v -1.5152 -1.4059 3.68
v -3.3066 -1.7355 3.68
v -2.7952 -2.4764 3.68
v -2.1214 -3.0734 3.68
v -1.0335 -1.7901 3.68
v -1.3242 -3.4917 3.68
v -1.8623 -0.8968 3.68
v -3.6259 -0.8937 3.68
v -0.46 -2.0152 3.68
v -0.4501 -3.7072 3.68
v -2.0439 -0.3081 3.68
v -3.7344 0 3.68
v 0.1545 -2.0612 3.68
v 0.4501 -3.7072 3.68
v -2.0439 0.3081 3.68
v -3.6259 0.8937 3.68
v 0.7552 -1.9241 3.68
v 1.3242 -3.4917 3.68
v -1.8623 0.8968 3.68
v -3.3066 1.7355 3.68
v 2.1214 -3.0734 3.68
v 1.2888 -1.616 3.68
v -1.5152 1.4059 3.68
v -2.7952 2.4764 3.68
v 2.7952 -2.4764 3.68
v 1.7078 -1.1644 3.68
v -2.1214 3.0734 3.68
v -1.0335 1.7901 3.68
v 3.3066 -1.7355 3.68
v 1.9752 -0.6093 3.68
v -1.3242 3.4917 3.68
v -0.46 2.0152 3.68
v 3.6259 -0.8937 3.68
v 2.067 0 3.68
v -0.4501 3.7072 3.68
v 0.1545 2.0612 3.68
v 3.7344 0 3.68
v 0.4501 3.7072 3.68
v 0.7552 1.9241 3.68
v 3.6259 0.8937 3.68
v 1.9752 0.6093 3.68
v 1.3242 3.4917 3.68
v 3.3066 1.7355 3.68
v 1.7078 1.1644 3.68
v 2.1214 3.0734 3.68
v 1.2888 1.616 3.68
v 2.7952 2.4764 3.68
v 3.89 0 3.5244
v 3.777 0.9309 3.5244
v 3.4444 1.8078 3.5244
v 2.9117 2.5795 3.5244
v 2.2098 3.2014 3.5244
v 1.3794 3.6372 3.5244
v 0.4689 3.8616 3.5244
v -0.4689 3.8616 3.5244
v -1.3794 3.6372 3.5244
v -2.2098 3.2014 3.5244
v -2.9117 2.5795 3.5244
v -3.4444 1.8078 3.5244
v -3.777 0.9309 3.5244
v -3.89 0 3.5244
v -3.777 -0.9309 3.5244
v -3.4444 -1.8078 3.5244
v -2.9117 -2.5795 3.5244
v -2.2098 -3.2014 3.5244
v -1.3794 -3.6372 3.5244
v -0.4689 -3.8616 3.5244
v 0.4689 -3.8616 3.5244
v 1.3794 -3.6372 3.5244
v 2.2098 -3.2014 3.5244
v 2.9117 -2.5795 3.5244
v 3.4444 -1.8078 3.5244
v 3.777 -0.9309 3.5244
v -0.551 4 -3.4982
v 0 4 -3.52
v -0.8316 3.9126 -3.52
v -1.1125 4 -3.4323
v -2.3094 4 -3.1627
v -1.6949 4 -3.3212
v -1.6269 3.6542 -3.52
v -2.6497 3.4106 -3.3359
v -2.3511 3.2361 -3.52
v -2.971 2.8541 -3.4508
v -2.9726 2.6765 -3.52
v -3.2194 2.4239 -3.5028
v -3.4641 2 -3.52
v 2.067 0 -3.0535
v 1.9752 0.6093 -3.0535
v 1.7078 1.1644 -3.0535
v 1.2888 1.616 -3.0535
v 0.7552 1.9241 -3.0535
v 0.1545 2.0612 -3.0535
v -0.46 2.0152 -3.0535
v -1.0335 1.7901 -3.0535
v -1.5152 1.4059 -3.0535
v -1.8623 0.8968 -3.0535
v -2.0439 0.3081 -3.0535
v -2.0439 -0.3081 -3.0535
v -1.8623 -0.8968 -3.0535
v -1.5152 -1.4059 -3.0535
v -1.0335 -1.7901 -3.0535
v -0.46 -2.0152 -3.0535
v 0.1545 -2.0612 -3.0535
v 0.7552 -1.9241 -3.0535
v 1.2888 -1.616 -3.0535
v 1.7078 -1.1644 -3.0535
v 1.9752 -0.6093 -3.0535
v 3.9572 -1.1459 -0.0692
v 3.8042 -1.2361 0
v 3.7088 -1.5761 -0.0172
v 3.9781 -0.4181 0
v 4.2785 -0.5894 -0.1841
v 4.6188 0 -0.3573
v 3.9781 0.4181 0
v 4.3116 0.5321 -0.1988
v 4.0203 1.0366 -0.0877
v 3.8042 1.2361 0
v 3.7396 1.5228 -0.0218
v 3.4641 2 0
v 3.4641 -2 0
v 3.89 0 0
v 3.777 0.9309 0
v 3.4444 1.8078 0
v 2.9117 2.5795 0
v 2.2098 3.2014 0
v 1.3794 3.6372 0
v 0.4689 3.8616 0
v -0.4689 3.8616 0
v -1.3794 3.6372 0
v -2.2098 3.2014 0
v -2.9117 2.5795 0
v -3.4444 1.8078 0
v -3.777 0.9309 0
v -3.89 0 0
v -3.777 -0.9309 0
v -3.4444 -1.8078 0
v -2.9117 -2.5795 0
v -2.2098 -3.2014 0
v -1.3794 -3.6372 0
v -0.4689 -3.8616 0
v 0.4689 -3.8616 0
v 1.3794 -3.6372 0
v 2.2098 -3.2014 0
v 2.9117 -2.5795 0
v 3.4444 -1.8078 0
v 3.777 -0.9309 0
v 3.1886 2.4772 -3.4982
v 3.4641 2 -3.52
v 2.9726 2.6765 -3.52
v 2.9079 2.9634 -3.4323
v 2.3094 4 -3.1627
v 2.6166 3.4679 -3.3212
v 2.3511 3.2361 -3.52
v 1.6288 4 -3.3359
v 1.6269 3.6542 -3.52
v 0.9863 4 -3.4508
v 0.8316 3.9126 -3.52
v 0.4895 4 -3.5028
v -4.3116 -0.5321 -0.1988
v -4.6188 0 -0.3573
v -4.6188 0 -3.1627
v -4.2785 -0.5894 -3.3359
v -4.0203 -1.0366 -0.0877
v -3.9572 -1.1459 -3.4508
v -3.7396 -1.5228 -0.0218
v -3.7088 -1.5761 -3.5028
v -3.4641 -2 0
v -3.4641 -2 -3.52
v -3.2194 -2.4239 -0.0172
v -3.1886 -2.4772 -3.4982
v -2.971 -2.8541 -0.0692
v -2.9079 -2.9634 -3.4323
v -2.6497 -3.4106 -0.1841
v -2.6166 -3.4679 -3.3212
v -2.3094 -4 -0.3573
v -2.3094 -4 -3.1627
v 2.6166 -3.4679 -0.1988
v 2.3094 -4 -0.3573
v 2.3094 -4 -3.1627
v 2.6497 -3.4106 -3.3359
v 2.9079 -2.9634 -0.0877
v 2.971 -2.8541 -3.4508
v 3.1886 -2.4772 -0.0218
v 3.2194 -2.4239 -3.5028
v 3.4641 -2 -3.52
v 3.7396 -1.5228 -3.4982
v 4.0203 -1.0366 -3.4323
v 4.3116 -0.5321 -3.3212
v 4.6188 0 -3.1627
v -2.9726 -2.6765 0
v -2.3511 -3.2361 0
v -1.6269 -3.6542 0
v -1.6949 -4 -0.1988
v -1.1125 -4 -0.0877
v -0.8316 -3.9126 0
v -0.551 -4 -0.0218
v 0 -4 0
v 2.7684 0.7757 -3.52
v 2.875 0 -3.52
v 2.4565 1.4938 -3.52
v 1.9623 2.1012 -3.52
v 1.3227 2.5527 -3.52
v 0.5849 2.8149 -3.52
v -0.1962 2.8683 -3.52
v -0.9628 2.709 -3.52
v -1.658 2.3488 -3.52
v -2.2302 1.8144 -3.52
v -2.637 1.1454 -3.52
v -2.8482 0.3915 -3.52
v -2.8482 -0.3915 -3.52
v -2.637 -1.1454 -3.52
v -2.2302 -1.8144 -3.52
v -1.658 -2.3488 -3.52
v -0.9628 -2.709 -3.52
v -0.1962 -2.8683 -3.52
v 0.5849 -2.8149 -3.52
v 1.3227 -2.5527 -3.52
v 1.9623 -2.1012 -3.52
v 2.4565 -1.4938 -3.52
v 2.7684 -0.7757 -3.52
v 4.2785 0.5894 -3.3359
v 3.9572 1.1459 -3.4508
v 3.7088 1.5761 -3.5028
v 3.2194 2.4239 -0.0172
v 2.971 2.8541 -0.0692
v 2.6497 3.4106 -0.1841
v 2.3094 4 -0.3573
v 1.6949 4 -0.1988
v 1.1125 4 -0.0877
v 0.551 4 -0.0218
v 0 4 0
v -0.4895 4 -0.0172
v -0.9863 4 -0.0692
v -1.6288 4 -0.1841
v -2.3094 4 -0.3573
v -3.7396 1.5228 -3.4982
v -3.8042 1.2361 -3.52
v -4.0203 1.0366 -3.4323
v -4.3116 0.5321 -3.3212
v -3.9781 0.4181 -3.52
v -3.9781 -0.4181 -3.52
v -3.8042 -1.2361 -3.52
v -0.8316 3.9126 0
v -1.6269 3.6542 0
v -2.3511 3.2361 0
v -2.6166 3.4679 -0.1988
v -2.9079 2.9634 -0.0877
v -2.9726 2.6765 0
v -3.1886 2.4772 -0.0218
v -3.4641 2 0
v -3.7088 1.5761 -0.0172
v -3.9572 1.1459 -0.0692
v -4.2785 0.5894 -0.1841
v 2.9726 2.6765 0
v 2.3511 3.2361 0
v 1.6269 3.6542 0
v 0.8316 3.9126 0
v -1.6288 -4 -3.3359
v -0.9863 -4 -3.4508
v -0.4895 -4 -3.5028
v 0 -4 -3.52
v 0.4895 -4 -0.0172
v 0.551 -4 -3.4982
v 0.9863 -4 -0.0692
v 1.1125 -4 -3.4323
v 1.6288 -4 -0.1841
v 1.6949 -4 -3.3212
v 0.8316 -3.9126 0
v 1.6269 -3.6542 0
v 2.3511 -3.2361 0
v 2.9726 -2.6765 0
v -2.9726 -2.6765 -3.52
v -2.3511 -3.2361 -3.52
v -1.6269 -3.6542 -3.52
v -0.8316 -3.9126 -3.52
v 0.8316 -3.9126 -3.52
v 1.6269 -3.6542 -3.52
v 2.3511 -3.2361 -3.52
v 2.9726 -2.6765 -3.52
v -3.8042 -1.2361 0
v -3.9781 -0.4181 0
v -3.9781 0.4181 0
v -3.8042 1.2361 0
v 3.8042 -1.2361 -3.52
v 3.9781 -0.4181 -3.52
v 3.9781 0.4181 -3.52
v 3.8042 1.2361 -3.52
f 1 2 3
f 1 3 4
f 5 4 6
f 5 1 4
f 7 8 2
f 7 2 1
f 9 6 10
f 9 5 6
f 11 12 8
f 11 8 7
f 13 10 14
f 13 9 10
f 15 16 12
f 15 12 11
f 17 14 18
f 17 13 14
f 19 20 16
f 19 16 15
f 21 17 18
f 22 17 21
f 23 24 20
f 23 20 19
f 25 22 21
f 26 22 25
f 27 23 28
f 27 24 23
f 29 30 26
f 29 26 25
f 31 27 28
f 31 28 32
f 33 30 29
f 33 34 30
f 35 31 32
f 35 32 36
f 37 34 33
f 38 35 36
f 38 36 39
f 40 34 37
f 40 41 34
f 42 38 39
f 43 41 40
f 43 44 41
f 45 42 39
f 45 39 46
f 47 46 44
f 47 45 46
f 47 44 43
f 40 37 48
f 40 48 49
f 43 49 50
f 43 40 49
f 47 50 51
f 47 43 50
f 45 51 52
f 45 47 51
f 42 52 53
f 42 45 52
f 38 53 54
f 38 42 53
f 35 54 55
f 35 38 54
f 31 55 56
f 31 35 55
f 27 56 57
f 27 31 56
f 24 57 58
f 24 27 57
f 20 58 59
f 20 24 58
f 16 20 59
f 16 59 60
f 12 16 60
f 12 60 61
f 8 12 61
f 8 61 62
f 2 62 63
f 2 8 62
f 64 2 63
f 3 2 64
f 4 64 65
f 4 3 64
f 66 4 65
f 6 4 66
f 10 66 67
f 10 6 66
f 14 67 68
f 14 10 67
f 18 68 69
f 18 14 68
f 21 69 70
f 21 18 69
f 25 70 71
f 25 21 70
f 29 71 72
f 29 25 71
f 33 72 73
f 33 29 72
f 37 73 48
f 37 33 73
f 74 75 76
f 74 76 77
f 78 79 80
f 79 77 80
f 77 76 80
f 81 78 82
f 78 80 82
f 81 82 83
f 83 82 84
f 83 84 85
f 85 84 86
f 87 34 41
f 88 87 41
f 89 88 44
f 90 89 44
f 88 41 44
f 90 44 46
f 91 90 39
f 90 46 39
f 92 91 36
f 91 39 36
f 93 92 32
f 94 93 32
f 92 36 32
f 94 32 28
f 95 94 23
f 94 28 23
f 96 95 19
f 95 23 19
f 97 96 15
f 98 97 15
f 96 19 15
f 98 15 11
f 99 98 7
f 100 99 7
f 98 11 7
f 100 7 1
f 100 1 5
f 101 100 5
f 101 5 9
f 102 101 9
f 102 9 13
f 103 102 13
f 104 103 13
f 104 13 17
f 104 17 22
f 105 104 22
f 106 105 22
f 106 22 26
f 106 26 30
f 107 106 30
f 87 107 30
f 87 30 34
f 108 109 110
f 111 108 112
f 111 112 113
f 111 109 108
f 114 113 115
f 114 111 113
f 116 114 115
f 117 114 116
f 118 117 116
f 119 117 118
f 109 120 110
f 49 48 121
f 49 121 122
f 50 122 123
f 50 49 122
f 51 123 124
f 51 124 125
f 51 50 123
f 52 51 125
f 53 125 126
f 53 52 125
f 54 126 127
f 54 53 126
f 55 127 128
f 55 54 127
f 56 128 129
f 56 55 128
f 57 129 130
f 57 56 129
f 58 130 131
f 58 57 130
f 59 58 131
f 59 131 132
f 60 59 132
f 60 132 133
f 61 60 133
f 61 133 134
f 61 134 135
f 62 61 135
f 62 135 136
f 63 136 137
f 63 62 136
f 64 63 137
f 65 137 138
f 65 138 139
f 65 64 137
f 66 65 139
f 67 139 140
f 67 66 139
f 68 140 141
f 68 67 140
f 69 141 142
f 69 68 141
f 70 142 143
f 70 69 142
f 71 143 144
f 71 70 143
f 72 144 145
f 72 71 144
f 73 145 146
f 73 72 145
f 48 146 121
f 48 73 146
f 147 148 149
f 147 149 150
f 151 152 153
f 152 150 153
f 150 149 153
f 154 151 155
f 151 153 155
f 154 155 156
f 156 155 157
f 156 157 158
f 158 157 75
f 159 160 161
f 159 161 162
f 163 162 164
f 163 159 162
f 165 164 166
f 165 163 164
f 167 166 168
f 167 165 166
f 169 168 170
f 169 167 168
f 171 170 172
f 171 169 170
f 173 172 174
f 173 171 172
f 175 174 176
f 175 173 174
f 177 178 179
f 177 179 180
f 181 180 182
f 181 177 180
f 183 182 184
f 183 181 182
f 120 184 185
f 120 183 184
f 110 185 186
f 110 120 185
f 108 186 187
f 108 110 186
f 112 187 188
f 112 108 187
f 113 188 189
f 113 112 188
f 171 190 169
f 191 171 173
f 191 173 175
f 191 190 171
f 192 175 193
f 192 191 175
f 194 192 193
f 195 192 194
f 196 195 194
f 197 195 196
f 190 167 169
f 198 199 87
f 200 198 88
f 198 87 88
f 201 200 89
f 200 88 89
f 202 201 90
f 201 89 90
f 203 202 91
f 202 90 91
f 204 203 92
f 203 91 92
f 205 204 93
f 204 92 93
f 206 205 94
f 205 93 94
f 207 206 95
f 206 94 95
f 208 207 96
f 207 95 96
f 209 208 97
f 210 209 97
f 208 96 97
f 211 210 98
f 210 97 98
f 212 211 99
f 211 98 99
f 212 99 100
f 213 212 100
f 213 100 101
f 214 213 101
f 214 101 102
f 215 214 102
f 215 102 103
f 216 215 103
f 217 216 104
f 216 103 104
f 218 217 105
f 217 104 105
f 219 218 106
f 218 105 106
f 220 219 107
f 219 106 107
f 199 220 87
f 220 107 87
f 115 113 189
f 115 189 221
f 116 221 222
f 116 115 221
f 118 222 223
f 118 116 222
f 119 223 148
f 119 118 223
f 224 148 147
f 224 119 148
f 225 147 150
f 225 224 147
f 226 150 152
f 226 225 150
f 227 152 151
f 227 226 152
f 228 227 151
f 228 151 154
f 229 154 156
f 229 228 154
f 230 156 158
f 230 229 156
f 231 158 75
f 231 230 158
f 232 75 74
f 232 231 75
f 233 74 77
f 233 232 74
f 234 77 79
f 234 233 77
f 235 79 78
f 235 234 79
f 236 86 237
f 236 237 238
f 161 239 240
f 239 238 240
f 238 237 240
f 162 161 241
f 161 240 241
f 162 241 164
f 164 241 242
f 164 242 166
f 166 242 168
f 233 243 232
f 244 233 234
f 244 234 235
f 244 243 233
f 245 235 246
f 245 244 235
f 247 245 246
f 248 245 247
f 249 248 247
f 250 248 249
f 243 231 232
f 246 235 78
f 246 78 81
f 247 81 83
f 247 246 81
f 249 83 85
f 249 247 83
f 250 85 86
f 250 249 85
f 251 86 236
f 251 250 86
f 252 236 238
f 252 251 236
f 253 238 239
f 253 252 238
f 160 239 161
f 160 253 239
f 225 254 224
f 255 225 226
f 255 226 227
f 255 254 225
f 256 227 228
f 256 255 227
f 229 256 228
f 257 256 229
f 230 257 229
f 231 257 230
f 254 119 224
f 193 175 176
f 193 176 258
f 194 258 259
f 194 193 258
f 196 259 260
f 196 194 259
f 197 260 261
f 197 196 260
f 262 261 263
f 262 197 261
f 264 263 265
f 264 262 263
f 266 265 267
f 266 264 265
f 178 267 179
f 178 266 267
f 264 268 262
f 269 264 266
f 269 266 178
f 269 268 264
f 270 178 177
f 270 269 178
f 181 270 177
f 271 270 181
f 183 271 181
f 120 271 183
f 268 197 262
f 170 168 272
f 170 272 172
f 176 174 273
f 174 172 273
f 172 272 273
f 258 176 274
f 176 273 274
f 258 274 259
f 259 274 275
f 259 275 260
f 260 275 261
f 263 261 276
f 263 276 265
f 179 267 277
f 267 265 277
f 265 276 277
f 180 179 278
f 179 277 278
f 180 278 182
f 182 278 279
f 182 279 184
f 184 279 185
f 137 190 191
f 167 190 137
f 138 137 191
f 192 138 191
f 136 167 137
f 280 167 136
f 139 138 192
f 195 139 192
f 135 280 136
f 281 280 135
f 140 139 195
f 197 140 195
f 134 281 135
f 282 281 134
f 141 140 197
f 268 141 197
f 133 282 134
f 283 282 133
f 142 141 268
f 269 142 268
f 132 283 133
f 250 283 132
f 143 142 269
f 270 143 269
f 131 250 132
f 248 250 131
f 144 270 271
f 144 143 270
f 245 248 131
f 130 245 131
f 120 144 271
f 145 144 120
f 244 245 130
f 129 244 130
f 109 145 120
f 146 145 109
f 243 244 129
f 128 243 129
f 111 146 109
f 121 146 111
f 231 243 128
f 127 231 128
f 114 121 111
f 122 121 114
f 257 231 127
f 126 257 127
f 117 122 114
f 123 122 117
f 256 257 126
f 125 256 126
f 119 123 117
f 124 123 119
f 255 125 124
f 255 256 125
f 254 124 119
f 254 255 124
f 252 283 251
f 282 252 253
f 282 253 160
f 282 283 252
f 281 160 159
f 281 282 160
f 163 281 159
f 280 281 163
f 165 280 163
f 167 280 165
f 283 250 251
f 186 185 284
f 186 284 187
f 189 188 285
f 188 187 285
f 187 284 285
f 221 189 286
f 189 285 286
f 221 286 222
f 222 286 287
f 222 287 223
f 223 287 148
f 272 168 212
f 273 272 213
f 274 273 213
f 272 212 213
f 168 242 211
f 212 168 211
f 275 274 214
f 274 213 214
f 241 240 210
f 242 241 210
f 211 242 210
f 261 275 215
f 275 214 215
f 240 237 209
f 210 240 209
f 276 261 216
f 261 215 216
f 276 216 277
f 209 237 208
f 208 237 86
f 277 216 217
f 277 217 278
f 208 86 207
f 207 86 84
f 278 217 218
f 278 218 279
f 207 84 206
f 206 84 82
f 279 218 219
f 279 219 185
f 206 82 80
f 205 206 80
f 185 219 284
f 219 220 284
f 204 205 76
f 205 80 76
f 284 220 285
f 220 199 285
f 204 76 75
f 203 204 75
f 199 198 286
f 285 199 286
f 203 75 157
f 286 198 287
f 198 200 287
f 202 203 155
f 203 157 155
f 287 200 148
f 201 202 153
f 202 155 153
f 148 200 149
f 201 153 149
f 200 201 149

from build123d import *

# Parameters (mm, degrees)
SKETCH1_R      = 2.067
BASENUT_DEPTH  = 3.52
EXTRUDE1_START = 3.68
SKETCH2_R      = 3.89
SKETCH2_R_2    = 2.067
EXTRUDE1_DEPTH = 3.68
CHAMFER1_SIZE  = 0.1556


with BuildPart() as part:
    # Sketch1 → BaseNut (new body)
    with BuildSketch(Plane.XY):
        Polygon((2.309401077, -4), (4.618802154, 0), (2.309401077, 4), (-2.309401077, 4), (-4.618802154, 0), (-2.309401077, -4), align=None)
        Circle(SKETCH1_R, mode=Mode.SUBTRACT)
    extrude(amount=-BASENUT_DEPTH)

    # Sketch3 → Double-Chamfer (revolve, cut)
    with BuildSketch(Plane(origin=(0, 0, 0), x_dir=(1, 0, 0), z_dir=(0, 1, 0))):
        Polygon((4, 3.52), (4.618802154, 3.52), (4.618802154, 3.16273441), align=None)
        Polygon((4.618802154, 0.35726559), (4, 0), (4.618802154, 0), align=None)
    revolve(axis=Axis((0, 0, -16.31077227), (0, 0, 1)), mode=Mode.SUBTRACT)

    # Sketch2 → Extrude1 (add)
    with BuildSketch(Plane(origin=(19.181370739, 9.516836059, 0), x_dir=(1, 0, 0), z_dir=(0, 0, 1)).offset(EXTRUDE1_START)):
        with Locations((-19.181370739, -9.516836059)):
            Circle(SKETCH2_R)
        with Locations((-19.181370739, -9.516836059)):
            Circle(SKETCH2_R_2, mode=Mode.SUBTRACT)
    extrude(amount=-EXTRUDE1_DEPTH)

    # Sketch5 → EndChamfer (revolve, cut)
    with BuildSketch(Plane(origin=(0, 0, 0), x_dir=(1, 0, 0), z_dir=(0, 1, 0))):
        Polygon((2.067, 3.52), (2.875, 3.52), (2.067, 3.053500982), align=None)
    revolve(axis=Axis((0, 0, -16.800797033), (0, 0, 1)), mode=Mode.SUBTRACT)

    # Chamfer1
    chamfer1_edges = [part.edges().sort_by_distance(p)[0] for p in [
        (-3.89, 0, 3.68),
    ]]
    chamfer(chamfer1_edges, length=CHAMFER1_SIZE)


solid = part.part
